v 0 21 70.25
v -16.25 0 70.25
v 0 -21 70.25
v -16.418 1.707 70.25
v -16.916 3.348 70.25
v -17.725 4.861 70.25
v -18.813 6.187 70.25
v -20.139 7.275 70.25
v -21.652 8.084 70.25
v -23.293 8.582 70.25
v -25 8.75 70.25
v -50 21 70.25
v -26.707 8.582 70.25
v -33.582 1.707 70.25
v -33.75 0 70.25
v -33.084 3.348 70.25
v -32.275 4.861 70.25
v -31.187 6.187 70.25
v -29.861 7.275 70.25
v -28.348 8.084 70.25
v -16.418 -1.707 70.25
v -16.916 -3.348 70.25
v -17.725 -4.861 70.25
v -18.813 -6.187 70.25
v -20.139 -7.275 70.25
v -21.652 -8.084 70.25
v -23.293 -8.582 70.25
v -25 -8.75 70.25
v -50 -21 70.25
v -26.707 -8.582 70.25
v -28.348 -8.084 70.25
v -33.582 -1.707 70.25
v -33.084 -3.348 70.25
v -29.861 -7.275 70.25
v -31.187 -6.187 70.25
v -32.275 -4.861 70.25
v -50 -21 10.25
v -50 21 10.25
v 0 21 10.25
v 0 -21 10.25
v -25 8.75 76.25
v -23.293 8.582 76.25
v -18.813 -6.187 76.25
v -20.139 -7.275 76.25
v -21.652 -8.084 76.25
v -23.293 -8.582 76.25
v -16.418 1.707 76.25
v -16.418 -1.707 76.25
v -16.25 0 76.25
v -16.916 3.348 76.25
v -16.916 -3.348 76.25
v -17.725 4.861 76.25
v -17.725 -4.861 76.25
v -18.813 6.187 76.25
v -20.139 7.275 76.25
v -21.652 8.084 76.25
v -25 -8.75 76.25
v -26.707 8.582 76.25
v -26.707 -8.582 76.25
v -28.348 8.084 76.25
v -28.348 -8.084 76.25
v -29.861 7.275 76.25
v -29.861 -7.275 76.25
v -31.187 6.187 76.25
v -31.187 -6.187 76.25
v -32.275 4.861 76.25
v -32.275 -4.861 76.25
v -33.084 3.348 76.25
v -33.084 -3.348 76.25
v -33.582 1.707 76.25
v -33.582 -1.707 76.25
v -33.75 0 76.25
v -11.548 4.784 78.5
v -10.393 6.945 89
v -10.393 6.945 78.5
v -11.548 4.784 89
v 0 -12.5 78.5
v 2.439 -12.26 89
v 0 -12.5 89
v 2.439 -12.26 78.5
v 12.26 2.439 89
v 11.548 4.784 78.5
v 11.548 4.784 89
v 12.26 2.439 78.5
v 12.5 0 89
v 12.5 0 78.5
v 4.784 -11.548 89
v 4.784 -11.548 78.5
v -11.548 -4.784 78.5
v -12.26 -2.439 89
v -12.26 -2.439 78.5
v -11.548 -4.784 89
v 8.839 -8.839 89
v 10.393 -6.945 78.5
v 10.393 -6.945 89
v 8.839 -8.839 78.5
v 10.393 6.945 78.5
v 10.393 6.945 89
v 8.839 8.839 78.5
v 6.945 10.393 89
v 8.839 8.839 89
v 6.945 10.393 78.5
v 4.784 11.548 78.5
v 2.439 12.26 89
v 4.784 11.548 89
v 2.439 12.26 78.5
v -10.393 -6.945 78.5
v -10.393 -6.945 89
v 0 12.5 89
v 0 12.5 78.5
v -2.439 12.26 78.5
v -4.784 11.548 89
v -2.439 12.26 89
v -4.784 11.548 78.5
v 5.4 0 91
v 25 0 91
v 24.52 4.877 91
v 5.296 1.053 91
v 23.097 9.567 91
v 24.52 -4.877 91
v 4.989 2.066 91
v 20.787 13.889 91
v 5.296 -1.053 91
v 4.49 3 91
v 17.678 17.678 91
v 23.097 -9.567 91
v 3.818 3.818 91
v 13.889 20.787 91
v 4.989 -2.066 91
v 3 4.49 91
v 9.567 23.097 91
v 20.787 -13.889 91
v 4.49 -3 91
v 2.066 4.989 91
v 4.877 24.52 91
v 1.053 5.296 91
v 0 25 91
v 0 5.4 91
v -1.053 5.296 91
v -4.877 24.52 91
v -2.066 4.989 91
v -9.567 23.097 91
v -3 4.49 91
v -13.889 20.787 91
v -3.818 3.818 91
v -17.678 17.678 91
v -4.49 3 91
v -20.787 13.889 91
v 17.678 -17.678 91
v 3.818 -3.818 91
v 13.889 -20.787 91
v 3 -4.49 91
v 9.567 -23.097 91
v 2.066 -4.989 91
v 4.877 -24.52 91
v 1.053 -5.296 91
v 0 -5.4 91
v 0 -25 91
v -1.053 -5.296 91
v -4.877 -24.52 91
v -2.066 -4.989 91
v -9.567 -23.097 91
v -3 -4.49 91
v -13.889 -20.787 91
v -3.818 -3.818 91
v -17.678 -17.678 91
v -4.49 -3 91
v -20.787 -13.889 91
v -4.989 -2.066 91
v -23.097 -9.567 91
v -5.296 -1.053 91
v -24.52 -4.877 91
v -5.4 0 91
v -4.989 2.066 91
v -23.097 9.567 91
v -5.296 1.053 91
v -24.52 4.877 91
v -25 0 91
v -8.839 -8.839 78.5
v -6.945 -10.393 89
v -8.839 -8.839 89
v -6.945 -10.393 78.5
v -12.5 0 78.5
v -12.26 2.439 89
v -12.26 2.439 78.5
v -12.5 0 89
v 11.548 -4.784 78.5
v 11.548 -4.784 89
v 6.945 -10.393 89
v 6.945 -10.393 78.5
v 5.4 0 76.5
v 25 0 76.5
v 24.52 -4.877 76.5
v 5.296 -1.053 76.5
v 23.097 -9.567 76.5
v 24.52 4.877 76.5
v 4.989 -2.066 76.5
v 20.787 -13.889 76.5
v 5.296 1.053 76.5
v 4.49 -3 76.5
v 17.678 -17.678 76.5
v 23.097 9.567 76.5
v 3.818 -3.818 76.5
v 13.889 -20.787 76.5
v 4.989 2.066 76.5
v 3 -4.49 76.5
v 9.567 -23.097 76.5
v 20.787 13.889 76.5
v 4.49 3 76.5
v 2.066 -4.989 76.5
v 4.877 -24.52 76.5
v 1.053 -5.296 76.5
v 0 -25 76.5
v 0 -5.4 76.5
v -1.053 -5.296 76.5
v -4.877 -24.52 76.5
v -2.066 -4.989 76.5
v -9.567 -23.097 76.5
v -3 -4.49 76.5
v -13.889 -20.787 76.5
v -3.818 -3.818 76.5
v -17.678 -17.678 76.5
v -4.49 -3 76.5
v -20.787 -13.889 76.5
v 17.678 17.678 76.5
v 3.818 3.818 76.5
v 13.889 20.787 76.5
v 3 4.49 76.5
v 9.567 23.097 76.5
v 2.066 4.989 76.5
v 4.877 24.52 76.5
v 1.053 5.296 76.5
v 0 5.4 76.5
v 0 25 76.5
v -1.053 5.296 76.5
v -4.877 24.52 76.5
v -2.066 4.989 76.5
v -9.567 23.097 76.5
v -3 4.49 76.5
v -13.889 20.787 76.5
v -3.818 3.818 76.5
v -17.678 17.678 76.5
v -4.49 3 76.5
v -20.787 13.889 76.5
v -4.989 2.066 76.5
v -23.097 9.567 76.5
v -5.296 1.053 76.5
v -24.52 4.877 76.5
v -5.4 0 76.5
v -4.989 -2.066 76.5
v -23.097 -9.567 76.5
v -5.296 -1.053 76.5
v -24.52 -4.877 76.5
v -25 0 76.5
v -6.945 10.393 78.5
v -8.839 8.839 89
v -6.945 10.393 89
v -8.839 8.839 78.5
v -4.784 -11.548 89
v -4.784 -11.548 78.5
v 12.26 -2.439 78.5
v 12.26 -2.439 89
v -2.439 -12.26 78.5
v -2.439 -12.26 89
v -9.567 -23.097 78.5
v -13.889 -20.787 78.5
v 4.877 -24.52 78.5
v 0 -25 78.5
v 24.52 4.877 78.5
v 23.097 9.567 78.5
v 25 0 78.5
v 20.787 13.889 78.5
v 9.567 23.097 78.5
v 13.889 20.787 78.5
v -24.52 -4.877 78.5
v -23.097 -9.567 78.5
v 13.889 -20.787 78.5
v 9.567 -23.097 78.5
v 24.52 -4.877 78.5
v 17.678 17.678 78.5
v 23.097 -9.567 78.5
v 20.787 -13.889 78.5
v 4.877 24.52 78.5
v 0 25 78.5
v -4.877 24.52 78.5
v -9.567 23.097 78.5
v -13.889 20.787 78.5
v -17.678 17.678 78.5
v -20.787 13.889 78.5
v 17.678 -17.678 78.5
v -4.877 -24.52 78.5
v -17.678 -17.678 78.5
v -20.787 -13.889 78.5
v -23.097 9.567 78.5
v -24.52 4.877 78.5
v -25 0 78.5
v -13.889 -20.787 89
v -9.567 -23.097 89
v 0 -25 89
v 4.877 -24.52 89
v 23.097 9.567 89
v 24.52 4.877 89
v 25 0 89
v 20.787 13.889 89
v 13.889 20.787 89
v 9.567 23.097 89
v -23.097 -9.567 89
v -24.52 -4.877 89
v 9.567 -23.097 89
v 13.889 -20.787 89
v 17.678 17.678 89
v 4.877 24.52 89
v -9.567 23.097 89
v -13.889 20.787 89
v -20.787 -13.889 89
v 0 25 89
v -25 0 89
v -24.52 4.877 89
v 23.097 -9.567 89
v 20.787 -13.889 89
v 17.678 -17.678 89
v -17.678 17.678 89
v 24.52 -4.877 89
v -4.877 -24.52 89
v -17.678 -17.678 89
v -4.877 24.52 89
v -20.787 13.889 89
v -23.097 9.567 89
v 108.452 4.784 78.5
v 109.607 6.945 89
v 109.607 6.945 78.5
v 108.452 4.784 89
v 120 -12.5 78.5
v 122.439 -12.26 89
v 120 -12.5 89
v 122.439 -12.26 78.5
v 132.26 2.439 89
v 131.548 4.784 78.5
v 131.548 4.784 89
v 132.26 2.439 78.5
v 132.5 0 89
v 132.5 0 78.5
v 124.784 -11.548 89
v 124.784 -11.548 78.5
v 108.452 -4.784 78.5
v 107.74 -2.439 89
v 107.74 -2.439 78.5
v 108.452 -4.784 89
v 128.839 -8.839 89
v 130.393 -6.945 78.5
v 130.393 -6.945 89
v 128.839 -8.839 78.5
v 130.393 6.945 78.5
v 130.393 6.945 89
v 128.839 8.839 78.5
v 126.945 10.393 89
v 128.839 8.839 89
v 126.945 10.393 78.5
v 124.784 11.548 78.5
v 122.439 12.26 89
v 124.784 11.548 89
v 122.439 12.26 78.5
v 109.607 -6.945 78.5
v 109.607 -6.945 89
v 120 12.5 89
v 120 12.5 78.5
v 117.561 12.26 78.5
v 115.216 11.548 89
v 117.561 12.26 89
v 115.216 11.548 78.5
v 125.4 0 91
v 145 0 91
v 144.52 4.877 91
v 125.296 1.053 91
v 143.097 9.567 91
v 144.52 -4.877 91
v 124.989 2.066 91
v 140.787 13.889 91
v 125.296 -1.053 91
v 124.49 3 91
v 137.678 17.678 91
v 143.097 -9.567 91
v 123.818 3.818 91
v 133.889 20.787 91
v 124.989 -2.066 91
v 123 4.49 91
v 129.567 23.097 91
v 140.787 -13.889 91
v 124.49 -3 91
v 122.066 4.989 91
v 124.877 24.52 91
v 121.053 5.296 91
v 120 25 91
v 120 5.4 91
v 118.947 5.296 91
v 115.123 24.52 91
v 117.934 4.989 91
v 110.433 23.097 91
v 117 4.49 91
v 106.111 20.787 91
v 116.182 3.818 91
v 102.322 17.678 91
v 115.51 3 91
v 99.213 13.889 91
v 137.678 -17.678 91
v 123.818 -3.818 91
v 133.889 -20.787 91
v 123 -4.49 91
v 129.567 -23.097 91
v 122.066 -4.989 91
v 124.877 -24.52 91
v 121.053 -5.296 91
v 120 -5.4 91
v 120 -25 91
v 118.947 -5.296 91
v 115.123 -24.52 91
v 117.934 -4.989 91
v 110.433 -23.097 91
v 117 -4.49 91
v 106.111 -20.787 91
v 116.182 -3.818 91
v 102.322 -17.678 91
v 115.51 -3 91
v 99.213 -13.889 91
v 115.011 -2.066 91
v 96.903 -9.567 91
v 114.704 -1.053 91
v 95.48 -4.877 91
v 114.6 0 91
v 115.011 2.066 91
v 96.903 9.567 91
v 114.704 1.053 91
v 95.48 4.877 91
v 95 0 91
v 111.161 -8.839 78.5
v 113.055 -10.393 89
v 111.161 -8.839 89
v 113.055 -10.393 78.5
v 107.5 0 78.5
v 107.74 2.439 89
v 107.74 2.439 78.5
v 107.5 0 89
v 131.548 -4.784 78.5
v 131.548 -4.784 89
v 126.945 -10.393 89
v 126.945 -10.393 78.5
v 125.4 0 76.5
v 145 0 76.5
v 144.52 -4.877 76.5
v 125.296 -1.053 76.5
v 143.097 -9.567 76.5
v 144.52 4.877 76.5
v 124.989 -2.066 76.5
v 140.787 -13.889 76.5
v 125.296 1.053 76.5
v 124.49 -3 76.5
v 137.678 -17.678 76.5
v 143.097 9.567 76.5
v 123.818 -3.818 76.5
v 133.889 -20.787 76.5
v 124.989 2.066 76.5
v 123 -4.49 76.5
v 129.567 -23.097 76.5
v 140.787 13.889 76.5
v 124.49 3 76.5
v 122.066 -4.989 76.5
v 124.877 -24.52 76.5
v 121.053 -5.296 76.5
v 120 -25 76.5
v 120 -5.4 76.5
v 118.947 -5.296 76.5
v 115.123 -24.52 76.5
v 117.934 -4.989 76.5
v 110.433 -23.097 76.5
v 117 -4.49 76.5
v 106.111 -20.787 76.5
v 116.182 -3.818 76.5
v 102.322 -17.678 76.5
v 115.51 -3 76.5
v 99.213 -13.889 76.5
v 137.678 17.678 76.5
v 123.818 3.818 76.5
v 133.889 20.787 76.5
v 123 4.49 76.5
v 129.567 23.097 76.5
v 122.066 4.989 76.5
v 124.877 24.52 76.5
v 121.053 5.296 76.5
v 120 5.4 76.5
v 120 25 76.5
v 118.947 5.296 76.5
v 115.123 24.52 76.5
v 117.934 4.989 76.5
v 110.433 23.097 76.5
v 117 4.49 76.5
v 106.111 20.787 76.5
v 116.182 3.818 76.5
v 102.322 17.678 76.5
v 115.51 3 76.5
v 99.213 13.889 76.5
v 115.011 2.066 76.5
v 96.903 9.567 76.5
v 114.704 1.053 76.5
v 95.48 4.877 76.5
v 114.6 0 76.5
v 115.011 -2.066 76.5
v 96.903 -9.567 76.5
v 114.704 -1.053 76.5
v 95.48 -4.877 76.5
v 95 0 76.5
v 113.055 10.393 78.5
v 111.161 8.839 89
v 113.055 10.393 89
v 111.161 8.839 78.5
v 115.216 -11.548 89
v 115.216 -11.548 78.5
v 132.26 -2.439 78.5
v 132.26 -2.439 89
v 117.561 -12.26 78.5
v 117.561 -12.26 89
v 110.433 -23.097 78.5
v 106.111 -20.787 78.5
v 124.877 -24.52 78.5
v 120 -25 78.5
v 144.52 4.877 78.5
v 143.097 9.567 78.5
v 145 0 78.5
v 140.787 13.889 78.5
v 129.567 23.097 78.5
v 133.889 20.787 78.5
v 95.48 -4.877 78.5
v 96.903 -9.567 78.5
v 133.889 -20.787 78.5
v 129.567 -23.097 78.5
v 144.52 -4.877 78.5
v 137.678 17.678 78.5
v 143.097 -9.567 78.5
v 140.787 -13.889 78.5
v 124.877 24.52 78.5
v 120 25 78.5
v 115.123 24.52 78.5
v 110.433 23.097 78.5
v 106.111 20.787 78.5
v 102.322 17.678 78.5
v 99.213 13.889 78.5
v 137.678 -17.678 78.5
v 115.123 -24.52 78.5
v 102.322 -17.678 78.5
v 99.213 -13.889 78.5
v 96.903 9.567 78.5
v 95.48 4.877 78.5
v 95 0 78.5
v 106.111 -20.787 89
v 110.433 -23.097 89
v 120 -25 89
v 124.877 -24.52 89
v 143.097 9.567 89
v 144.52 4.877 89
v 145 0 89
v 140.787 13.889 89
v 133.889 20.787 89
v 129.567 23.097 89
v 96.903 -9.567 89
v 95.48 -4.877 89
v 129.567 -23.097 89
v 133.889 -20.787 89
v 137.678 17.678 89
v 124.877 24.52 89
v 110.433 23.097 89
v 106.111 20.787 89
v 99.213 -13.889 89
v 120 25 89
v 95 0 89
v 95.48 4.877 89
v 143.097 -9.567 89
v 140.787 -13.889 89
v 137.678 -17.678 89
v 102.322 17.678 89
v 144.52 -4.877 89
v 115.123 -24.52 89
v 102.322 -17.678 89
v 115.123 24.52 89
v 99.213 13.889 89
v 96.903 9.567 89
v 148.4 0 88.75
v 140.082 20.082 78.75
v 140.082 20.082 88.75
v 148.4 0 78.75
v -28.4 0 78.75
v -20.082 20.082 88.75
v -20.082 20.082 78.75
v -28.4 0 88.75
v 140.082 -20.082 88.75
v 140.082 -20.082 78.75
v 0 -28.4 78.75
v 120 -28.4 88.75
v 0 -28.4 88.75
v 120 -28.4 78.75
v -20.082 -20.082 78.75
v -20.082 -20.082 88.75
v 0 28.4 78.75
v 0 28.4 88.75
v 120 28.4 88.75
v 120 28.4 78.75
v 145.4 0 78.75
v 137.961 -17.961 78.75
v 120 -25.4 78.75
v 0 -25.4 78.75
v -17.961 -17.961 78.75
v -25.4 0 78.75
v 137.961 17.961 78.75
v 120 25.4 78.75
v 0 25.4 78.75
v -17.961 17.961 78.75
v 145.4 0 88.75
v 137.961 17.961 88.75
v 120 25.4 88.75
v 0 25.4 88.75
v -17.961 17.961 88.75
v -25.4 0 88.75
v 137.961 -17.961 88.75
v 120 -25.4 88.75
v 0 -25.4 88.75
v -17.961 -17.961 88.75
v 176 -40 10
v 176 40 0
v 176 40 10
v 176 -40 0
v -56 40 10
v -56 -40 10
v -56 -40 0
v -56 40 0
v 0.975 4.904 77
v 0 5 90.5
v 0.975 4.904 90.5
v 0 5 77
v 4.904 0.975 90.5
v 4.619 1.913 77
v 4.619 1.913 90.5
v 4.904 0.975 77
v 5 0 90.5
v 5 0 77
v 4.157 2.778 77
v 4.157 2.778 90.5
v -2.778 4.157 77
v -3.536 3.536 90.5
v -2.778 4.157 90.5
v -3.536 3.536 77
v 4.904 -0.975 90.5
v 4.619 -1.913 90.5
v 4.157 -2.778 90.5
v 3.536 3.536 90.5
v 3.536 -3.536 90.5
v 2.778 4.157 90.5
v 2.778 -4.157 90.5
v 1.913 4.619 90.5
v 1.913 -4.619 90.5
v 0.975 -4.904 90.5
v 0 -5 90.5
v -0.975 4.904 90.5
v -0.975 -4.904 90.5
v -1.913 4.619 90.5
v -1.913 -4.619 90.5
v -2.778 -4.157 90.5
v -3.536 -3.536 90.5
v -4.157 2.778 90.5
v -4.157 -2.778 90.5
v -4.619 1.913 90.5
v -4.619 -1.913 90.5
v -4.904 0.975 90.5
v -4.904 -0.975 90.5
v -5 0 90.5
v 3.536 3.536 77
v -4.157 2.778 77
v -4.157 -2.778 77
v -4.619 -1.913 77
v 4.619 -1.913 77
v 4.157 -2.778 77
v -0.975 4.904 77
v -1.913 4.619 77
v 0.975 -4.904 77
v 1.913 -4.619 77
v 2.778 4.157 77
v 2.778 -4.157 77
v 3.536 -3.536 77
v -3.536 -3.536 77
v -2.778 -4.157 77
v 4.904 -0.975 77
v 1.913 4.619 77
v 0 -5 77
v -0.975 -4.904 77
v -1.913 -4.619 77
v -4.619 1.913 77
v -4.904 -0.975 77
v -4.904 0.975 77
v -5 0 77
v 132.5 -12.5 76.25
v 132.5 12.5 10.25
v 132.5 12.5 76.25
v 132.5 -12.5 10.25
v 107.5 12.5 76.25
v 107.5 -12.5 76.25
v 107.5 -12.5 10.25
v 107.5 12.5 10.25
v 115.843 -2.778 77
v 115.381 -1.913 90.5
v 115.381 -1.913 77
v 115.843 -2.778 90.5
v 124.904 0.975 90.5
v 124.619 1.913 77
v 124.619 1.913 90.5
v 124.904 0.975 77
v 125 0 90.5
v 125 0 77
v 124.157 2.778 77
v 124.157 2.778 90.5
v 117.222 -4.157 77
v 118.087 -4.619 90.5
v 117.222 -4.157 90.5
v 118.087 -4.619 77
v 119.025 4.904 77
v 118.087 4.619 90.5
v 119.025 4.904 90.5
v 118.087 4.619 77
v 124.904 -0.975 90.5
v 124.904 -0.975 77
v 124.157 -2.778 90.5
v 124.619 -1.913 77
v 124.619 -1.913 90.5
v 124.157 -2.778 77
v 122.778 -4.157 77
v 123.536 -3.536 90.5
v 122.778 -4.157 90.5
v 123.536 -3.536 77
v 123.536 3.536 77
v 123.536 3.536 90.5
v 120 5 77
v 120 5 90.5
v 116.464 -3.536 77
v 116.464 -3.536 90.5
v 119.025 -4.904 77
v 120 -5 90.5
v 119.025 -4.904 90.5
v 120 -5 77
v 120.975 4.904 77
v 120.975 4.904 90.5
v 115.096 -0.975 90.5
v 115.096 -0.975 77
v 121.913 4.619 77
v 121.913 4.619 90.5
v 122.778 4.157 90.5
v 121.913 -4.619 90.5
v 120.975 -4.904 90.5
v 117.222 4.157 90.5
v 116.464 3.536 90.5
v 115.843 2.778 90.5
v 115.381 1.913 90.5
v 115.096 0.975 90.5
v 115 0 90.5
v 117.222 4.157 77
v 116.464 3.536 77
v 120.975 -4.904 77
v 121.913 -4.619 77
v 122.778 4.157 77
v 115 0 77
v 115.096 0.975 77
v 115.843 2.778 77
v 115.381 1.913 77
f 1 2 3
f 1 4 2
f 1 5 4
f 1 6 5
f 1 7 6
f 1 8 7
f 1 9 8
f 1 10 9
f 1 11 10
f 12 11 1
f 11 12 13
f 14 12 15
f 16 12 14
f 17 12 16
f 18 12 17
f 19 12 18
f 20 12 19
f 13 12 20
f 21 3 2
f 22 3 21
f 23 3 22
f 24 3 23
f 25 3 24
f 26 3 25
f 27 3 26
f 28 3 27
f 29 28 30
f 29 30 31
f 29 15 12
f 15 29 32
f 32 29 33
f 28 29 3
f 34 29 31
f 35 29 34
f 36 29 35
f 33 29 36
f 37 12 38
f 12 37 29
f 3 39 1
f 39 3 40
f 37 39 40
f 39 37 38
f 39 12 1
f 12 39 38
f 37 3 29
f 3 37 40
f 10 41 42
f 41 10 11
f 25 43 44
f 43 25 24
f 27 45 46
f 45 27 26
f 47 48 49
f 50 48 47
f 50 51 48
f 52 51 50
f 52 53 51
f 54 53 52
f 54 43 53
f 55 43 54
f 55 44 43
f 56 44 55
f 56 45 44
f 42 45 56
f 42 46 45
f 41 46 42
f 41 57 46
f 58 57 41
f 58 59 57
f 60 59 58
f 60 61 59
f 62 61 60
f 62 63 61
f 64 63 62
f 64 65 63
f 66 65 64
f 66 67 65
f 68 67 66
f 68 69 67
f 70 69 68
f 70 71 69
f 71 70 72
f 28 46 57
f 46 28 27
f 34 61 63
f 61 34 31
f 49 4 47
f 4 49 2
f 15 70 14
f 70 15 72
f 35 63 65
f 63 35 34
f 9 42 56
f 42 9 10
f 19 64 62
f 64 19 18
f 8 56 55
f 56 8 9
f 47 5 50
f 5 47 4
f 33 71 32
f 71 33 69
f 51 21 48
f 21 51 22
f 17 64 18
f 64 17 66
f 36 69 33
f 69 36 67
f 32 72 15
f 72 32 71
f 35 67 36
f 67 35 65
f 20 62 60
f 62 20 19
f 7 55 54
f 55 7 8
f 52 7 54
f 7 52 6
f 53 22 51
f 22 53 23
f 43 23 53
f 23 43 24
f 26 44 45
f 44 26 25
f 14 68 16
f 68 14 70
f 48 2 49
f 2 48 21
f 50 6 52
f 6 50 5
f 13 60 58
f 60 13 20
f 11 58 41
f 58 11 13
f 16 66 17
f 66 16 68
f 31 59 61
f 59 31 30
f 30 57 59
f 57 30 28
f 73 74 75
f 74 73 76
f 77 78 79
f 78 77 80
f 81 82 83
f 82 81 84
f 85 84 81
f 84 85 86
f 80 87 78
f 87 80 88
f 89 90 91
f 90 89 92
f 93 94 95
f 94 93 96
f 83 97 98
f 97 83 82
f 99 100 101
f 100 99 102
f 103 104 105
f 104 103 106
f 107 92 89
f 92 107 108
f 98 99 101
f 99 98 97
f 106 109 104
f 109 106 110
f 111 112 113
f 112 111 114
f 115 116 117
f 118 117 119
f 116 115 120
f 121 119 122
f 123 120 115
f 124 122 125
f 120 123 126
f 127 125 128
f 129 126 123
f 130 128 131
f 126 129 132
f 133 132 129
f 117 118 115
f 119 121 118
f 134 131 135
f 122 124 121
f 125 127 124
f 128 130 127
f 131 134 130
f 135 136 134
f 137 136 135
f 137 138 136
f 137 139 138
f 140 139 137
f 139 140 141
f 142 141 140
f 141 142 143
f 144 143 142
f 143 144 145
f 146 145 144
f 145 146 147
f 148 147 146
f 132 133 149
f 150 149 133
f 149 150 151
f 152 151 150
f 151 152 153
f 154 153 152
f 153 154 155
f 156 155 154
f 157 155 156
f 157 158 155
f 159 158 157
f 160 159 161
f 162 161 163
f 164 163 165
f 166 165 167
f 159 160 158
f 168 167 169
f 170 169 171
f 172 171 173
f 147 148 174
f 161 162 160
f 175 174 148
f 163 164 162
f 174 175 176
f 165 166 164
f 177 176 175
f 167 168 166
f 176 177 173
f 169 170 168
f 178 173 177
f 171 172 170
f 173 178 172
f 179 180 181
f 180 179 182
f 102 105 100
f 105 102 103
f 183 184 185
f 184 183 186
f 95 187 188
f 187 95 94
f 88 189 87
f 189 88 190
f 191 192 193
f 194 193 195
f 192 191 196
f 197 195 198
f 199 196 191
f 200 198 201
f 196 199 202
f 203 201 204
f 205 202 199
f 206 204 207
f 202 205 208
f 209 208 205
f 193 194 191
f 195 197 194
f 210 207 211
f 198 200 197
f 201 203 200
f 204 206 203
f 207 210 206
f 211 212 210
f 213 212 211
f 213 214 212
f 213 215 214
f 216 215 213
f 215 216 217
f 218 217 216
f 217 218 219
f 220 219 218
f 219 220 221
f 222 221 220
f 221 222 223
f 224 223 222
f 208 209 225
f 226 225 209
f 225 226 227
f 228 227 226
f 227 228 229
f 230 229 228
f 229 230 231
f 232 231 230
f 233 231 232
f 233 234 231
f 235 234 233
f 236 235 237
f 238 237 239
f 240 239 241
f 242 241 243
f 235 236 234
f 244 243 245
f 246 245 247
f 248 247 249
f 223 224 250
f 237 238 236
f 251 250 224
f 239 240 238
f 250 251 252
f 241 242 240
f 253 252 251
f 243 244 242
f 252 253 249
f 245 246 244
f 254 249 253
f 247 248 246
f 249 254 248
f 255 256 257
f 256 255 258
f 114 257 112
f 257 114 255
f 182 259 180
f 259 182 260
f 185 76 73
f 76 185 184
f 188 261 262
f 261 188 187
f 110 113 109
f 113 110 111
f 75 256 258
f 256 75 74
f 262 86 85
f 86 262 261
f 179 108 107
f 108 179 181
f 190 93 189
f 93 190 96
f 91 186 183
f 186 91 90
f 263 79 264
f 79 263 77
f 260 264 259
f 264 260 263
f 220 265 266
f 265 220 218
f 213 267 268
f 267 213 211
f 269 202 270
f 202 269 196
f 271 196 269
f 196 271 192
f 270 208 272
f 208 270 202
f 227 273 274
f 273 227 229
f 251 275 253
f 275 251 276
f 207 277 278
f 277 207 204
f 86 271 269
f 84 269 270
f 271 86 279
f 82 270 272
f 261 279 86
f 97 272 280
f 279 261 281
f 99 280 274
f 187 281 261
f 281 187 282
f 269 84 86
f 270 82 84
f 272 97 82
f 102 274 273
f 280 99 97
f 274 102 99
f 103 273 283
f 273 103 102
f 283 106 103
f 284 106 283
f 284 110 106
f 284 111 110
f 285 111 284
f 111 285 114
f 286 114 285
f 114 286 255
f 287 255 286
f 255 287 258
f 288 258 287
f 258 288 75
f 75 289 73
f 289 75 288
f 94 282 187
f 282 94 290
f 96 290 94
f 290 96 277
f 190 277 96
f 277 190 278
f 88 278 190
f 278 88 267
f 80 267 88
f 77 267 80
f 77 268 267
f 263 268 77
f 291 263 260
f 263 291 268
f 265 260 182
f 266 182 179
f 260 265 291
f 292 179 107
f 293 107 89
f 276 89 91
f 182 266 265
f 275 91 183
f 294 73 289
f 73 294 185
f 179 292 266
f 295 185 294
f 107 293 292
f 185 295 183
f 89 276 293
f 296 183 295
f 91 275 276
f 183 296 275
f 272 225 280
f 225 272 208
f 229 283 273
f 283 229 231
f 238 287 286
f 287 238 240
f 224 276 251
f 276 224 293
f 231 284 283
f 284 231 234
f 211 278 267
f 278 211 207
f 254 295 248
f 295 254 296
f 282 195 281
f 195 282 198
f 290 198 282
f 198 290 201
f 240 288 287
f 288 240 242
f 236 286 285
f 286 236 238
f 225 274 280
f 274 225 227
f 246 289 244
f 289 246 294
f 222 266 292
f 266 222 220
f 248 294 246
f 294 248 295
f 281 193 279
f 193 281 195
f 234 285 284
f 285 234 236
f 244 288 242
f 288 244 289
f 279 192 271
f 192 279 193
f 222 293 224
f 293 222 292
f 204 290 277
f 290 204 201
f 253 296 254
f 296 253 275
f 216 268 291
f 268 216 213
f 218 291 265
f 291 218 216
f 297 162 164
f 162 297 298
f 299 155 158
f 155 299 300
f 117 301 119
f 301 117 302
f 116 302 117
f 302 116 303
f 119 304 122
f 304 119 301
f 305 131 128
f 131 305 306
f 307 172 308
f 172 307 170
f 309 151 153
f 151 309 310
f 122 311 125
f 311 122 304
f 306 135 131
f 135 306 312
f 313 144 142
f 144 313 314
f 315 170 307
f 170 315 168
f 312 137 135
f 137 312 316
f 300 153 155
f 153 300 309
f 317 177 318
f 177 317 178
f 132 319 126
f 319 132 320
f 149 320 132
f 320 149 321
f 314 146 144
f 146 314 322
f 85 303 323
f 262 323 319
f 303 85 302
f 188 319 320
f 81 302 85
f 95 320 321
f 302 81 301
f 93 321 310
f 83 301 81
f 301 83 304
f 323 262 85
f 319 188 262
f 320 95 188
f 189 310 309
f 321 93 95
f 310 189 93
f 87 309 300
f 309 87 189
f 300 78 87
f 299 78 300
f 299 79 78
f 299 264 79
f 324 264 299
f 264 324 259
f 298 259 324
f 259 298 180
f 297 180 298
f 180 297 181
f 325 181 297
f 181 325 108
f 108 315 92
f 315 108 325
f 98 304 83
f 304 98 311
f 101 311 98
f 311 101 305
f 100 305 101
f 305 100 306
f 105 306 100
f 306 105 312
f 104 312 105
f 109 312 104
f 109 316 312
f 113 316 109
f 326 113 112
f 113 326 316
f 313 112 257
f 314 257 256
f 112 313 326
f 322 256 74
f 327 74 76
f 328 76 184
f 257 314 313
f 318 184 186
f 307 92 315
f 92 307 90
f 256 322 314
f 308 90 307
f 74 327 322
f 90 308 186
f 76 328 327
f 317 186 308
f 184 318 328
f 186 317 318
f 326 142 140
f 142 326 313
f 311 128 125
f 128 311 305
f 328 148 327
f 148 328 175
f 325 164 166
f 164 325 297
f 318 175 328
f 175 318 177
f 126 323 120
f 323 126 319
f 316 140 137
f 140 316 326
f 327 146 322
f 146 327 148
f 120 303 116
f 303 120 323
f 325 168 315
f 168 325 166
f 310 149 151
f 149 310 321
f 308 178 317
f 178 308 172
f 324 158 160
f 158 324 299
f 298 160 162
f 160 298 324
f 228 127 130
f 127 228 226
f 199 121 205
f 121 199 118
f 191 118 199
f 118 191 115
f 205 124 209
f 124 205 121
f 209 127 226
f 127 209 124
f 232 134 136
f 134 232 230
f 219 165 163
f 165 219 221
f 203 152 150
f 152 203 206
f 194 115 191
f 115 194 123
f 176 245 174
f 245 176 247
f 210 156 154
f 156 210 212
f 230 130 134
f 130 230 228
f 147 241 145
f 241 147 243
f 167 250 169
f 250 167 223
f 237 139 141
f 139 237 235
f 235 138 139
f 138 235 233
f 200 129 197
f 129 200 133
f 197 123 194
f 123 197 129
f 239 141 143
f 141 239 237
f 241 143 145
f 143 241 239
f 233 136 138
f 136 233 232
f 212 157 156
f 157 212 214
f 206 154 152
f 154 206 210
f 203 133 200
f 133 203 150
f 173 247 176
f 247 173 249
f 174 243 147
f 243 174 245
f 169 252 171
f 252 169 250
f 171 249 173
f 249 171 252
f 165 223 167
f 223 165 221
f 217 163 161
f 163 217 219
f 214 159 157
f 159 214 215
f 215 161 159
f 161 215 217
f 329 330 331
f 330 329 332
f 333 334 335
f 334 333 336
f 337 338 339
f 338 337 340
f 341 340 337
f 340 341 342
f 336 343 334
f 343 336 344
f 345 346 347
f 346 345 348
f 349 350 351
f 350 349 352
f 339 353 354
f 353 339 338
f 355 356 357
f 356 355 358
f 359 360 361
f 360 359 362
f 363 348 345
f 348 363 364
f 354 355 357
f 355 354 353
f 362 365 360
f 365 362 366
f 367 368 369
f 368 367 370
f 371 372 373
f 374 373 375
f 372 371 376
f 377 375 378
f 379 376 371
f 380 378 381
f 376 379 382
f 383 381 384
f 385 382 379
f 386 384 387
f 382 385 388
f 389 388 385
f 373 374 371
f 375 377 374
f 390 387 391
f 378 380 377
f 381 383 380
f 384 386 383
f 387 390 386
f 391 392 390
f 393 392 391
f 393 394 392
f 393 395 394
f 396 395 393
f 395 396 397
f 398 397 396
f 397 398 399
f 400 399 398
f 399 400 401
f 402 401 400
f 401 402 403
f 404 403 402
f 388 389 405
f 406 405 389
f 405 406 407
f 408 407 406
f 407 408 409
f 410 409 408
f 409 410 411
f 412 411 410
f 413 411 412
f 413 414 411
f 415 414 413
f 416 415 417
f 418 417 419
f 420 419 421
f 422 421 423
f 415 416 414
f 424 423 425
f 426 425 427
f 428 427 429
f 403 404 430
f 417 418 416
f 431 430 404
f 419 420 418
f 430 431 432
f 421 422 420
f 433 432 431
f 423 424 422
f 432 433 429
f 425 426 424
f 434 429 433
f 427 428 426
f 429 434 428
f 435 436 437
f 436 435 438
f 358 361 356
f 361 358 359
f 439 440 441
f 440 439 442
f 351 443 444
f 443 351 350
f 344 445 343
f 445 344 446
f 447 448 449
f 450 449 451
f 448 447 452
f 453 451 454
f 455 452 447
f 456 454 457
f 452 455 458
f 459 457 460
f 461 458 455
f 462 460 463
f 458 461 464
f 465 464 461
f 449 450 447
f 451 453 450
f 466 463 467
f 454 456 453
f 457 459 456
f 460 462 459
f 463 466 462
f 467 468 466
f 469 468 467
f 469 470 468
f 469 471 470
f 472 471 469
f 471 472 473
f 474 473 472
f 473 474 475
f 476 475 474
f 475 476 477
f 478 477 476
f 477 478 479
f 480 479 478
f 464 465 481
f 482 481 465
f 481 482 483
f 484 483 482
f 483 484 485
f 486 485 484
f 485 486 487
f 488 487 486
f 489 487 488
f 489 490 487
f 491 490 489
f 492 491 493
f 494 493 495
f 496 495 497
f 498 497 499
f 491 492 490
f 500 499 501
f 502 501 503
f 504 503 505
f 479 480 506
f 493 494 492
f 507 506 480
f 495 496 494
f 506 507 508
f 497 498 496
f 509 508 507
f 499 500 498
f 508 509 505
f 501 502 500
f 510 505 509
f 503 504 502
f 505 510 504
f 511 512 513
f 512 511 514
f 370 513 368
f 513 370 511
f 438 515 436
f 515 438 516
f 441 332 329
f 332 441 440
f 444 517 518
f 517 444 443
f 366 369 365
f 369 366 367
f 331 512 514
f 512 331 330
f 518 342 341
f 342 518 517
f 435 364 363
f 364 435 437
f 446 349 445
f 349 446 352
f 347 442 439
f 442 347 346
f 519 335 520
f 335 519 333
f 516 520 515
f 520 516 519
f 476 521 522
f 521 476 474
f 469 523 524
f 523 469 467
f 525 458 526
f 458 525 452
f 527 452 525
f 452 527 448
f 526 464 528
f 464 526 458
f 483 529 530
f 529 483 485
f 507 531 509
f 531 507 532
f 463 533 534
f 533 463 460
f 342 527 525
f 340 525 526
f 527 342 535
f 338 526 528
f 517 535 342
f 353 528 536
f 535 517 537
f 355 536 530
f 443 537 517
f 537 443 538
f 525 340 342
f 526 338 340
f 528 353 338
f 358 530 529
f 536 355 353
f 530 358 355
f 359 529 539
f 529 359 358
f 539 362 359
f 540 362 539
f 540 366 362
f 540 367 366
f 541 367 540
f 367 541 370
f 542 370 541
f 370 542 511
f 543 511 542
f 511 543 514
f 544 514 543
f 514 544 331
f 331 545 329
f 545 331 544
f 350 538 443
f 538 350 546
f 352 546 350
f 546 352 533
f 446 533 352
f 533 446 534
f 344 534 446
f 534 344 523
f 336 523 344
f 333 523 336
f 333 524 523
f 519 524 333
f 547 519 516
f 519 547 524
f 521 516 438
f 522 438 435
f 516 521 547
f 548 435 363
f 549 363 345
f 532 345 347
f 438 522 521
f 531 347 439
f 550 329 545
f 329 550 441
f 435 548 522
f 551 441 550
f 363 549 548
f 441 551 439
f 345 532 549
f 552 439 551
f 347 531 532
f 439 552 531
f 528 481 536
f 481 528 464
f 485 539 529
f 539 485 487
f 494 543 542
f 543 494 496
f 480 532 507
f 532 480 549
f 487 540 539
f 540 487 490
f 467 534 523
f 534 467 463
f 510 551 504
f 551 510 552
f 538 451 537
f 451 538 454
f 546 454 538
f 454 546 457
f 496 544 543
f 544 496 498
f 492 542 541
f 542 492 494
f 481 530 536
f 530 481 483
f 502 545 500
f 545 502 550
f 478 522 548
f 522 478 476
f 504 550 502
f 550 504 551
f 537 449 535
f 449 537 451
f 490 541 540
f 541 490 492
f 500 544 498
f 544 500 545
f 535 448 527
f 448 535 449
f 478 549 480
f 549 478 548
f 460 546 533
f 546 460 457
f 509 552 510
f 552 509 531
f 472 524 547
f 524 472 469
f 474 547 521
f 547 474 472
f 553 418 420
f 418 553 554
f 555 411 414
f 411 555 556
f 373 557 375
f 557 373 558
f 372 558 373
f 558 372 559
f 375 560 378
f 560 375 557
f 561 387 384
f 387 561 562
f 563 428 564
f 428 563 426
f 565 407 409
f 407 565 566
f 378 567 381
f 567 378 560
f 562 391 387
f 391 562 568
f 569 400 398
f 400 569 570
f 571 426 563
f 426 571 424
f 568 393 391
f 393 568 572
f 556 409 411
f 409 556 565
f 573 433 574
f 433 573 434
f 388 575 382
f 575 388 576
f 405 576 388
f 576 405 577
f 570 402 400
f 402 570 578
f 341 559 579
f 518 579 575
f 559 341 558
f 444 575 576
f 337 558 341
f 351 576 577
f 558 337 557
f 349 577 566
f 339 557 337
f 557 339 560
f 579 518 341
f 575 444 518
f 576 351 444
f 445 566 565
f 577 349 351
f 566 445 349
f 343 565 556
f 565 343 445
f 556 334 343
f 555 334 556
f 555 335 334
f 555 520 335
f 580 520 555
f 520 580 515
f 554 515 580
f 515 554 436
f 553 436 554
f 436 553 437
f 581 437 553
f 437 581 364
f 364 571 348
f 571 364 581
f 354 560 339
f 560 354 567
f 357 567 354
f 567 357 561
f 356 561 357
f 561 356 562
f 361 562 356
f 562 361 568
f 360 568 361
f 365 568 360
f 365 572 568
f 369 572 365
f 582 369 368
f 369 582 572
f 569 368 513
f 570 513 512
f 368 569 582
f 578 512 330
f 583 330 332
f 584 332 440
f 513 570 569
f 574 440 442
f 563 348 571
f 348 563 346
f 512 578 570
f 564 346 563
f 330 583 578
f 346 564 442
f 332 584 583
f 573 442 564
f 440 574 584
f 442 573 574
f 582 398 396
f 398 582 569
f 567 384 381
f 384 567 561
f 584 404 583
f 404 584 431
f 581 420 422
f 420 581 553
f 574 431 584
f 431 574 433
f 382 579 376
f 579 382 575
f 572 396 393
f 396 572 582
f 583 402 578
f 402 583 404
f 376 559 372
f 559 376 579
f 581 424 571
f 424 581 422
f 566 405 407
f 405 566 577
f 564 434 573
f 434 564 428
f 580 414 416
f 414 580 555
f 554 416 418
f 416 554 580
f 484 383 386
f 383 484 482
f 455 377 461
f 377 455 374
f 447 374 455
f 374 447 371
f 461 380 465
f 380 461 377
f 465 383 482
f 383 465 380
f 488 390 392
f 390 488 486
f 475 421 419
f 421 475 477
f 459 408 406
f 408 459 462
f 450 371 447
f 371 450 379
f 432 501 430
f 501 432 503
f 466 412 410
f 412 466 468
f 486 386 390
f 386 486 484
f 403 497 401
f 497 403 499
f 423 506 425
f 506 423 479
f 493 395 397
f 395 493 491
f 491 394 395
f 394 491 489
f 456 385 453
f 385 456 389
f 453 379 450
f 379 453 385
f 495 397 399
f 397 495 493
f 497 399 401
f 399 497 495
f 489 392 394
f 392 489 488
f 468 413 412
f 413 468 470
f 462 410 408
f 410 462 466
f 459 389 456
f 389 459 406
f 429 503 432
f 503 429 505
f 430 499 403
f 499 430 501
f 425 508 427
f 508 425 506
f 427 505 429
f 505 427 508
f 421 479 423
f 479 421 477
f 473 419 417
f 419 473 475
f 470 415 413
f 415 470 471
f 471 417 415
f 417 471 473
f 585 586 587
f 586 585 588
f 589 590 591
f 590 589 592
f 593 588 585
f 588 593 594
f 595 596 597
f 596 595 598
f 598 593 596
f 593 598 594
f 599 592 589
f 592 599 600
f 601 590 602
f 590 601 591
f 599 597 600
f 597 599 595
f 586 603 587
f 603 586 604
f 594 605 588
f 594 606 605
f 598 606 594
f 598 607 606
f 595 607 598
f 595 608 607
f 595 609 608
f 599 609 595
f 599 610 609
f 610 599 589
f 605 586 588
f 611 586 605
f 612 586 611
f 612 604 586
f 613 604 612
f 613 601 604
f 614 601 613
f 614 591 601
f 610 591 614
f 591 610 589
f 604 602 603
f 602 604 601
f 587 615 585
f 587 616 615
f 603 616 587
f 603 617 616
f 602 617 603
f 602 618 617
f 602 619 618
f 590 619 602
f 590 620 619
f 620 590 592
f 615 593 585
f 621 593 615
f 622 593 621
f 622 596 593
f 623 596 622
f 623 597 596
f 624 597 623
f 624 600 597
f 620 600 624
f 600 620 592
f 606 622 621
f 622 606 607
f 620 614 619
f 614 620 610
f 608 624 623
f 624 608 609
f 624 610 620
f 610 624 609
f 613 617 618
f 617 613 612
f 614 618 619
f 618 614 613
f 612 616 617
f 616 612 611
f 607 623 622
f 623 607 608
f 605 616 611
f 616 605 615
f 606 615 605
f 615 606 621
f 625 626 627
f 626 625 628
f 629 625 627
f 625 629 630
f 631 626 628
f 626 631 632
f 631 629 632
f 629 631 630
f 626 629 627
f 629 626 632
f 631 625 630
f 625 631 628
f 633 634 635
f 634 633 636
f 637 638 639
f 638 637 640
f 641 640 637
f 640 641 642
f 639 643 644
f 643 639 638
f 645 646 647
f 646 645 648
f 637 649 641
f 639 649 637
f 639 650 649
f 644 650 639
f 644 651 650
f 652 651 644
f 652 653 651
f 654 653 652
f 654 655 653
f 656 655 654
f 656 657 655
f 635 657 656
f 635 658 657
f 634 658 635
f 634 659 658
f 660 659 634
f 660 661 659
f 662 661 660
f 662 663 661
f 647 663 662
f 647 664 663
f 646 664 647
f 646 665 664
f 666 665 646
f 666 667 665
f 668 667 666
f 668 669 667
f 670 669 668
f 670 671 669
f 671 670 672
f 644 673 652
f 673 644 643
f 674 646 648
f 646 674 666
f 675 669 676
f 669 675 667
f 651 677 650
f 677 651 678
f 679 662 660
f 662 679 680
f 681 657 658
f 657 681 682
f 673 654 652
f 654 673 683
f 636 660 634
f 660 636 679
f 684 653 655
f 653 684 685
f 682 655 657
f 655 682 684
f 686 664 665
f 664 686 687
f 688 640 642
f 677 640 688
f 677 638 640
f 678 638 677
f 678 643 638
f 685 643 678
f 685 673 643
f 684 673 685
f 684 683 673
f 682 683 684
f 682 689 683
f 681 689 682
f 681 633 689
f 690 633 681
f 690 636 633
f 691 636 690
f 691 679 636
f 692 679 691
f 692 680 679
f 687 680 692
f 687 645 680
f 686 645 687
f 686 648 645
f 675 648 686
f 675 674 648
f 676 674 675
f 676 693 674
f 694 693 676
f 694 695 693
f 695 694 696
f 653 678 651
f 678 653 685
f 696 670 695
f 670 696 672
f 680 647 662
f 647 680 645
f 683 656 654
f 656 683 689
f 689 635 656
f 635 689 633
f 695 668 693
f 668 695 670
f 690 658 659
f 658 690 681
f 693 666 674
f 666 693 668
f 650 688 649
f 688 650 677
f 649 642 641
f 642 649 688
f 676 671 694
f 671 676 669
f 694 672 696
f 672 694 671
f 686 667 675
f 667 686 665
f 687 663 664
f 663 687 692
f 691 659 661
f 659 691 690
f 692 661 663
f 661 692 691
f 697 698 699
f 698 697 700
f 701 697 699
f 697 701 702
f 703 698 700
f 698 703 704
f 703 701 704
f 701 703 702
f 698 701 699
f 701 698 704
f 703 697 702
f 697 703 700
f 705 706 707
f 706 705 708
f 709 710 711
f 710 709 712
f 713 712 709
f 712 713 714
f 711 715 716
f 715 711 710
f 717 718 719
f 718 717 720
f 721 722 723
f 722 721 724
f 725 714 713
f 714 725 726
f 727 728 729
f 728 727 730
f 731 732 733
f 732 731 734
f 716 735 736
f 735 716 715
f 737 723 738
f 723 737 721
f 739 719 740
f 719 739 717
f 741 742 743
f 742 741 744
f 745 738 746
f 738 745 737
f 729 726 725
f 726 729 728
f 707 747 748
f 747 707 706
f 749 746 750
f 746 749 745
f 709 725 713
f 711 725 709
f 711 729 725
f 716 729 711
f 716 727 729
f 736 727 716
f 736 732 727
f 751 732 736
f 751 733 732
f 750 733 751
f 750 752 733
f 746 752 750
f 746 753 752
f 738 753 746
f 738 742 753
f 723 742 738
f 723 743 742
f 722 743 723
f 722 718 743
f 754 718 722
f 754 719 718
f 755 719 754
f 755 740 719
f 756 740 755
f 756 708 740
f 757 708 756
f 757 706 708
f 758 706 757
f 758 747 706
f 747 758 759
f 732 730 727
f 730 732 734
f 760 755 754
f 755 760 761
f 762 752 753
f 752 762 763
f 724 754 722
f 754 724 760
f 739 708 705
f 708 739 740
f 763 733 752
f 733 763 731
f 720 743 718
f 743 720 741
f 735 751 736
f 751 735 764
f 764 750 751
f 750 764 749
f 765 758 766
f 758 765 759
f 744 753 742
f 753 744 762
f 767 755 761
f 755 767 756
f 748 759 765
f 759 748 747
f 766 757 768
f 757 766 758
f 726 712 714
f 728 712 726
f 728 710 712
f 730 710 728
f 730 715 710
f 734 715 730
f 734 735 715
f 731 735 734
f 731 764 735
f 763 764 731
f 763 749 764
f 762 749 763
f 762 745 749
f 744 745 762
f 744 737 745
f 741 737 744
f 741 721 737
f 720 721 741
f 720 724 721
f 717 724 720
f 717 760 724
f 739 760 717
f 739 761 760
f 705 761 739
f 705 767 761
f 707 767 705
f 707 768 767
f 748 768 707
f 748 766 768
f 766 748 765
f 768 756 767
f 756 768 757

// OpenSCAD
$fn = 32;

// ------------------------------------------------------------------------
// Motor belt drive: span 120 mm, pulleys d50, belt 10 mm wide
// Every part is its own module, assembly() places every instance.
// ------------------------------------------------------------------------

// --- part 1 ---
module base_plate() {
  difference() {
    translate([-116, -40, 0]) cube([232, 80, 10]);
  }
}

// --- part 2 ---
module motor() {
  union() {
    translate([-30, -21, 0]) cube([60, 42, 50]);
    translate([33, 0, 25]) rotate([0, 90, 0]) cylinder(h = 6, d = 17.5, center = true);
  }
}

// --- part 3 ---
module drive_shaft() {
  translate([0, 0, -6.75]) cylinder(h = 13.5, d = 10);
}

// --- part 4 ---
module pulley_drive() {
  difference() {
    union() {
      cylinder(h = 14.5, d = 25);
      cylinder(h = 2, d = 50);
      translate([0, 0, 12.5]) cylinder(h = 2, d = 50);
    }
    translate([0, 0, -1]) cylinder(h = 16.5, d = 10.8);
  }
}

// --- part 5 ---
module idler_post() {
  translate([-12.5, -12.5, 0]) cube([25, 25, 66]);
}

// --- part 6 ---
module driven_shaft() {
  translate([0, 0, -6.75]) cylinder(h = 13.5, d = 10);
}

// --- part 7 ---
module pulley_driven() {
  difference() {
    union() {
      cylinder(h = 14.5, d = 25);
      cylinder(h = 2, d = 50);
      translate([0, 0, 12.5]) cylinder(h = 2, d = 50);
    }
    translate([0, 0, -1]) cylinder(h = 16.5, d = 10.8);
  }
}

// --- part 8 ---
module drive_belt() {
  difference() {
    linear_extrude(height = 10) polygon(points = concat([for (a = [90 : 45 : 270]) [28.4 * cos(a), 28.4 * sin(a)]], [for (a = [270 : 45 : 450]) [120 + 28.4 * cos(a), 28.4 * sin(a)]]));
    translate([0, 0, -1]) linear_extrude(height = 12) polygon(points = concat([for (a = [90 : 45 : 270]) [25.4 * cos(a), 25.4 * sin(a)]], [for (a = [270 : 45 : 450]) [120 + 25.4 * cos(a), 25.4 * sin(a)]]));
  }
}

// --- assembly ---
module assembly() {
  color([0.80, 0.24, 0.20]) translate([60, 0, 0]) rotate([0, 0, 0]) base_plate();
  color([0.20, 0.45, 0.75]) translate([0, 0, 40.25]) rotate([0, 270, 0]) motor();
  color([0.25, 0.62, 0.32]) translate([0, 0, 83.75]) rotate([0, 0, 0]) drive_shaft();
  color([0.92, 0.70, 0.18]) translate([0, 0, 76.5]) rotate([0, 0, 0]) pulley_drive();
  color([0.58, 0.35, 0.70]) translate([120, 0, 10.25]) rotate([0, 0, 0]) idler_post();
  color([0.16, 0.66, 0.66]) translate([120, 0, 83.75]) rotate([0, 0, 0]) driven_shaft();
  color([0.85, 0.48, 0.18]) translate([120, 0, 76.5]) rotate([0, 0, 0]) pulley_driven();
  color([0.55, 0.60, 0.65]) translate([0, 0, 78.75]) rotate([0, 0, 0]) drive_belt();
}

assembly();
